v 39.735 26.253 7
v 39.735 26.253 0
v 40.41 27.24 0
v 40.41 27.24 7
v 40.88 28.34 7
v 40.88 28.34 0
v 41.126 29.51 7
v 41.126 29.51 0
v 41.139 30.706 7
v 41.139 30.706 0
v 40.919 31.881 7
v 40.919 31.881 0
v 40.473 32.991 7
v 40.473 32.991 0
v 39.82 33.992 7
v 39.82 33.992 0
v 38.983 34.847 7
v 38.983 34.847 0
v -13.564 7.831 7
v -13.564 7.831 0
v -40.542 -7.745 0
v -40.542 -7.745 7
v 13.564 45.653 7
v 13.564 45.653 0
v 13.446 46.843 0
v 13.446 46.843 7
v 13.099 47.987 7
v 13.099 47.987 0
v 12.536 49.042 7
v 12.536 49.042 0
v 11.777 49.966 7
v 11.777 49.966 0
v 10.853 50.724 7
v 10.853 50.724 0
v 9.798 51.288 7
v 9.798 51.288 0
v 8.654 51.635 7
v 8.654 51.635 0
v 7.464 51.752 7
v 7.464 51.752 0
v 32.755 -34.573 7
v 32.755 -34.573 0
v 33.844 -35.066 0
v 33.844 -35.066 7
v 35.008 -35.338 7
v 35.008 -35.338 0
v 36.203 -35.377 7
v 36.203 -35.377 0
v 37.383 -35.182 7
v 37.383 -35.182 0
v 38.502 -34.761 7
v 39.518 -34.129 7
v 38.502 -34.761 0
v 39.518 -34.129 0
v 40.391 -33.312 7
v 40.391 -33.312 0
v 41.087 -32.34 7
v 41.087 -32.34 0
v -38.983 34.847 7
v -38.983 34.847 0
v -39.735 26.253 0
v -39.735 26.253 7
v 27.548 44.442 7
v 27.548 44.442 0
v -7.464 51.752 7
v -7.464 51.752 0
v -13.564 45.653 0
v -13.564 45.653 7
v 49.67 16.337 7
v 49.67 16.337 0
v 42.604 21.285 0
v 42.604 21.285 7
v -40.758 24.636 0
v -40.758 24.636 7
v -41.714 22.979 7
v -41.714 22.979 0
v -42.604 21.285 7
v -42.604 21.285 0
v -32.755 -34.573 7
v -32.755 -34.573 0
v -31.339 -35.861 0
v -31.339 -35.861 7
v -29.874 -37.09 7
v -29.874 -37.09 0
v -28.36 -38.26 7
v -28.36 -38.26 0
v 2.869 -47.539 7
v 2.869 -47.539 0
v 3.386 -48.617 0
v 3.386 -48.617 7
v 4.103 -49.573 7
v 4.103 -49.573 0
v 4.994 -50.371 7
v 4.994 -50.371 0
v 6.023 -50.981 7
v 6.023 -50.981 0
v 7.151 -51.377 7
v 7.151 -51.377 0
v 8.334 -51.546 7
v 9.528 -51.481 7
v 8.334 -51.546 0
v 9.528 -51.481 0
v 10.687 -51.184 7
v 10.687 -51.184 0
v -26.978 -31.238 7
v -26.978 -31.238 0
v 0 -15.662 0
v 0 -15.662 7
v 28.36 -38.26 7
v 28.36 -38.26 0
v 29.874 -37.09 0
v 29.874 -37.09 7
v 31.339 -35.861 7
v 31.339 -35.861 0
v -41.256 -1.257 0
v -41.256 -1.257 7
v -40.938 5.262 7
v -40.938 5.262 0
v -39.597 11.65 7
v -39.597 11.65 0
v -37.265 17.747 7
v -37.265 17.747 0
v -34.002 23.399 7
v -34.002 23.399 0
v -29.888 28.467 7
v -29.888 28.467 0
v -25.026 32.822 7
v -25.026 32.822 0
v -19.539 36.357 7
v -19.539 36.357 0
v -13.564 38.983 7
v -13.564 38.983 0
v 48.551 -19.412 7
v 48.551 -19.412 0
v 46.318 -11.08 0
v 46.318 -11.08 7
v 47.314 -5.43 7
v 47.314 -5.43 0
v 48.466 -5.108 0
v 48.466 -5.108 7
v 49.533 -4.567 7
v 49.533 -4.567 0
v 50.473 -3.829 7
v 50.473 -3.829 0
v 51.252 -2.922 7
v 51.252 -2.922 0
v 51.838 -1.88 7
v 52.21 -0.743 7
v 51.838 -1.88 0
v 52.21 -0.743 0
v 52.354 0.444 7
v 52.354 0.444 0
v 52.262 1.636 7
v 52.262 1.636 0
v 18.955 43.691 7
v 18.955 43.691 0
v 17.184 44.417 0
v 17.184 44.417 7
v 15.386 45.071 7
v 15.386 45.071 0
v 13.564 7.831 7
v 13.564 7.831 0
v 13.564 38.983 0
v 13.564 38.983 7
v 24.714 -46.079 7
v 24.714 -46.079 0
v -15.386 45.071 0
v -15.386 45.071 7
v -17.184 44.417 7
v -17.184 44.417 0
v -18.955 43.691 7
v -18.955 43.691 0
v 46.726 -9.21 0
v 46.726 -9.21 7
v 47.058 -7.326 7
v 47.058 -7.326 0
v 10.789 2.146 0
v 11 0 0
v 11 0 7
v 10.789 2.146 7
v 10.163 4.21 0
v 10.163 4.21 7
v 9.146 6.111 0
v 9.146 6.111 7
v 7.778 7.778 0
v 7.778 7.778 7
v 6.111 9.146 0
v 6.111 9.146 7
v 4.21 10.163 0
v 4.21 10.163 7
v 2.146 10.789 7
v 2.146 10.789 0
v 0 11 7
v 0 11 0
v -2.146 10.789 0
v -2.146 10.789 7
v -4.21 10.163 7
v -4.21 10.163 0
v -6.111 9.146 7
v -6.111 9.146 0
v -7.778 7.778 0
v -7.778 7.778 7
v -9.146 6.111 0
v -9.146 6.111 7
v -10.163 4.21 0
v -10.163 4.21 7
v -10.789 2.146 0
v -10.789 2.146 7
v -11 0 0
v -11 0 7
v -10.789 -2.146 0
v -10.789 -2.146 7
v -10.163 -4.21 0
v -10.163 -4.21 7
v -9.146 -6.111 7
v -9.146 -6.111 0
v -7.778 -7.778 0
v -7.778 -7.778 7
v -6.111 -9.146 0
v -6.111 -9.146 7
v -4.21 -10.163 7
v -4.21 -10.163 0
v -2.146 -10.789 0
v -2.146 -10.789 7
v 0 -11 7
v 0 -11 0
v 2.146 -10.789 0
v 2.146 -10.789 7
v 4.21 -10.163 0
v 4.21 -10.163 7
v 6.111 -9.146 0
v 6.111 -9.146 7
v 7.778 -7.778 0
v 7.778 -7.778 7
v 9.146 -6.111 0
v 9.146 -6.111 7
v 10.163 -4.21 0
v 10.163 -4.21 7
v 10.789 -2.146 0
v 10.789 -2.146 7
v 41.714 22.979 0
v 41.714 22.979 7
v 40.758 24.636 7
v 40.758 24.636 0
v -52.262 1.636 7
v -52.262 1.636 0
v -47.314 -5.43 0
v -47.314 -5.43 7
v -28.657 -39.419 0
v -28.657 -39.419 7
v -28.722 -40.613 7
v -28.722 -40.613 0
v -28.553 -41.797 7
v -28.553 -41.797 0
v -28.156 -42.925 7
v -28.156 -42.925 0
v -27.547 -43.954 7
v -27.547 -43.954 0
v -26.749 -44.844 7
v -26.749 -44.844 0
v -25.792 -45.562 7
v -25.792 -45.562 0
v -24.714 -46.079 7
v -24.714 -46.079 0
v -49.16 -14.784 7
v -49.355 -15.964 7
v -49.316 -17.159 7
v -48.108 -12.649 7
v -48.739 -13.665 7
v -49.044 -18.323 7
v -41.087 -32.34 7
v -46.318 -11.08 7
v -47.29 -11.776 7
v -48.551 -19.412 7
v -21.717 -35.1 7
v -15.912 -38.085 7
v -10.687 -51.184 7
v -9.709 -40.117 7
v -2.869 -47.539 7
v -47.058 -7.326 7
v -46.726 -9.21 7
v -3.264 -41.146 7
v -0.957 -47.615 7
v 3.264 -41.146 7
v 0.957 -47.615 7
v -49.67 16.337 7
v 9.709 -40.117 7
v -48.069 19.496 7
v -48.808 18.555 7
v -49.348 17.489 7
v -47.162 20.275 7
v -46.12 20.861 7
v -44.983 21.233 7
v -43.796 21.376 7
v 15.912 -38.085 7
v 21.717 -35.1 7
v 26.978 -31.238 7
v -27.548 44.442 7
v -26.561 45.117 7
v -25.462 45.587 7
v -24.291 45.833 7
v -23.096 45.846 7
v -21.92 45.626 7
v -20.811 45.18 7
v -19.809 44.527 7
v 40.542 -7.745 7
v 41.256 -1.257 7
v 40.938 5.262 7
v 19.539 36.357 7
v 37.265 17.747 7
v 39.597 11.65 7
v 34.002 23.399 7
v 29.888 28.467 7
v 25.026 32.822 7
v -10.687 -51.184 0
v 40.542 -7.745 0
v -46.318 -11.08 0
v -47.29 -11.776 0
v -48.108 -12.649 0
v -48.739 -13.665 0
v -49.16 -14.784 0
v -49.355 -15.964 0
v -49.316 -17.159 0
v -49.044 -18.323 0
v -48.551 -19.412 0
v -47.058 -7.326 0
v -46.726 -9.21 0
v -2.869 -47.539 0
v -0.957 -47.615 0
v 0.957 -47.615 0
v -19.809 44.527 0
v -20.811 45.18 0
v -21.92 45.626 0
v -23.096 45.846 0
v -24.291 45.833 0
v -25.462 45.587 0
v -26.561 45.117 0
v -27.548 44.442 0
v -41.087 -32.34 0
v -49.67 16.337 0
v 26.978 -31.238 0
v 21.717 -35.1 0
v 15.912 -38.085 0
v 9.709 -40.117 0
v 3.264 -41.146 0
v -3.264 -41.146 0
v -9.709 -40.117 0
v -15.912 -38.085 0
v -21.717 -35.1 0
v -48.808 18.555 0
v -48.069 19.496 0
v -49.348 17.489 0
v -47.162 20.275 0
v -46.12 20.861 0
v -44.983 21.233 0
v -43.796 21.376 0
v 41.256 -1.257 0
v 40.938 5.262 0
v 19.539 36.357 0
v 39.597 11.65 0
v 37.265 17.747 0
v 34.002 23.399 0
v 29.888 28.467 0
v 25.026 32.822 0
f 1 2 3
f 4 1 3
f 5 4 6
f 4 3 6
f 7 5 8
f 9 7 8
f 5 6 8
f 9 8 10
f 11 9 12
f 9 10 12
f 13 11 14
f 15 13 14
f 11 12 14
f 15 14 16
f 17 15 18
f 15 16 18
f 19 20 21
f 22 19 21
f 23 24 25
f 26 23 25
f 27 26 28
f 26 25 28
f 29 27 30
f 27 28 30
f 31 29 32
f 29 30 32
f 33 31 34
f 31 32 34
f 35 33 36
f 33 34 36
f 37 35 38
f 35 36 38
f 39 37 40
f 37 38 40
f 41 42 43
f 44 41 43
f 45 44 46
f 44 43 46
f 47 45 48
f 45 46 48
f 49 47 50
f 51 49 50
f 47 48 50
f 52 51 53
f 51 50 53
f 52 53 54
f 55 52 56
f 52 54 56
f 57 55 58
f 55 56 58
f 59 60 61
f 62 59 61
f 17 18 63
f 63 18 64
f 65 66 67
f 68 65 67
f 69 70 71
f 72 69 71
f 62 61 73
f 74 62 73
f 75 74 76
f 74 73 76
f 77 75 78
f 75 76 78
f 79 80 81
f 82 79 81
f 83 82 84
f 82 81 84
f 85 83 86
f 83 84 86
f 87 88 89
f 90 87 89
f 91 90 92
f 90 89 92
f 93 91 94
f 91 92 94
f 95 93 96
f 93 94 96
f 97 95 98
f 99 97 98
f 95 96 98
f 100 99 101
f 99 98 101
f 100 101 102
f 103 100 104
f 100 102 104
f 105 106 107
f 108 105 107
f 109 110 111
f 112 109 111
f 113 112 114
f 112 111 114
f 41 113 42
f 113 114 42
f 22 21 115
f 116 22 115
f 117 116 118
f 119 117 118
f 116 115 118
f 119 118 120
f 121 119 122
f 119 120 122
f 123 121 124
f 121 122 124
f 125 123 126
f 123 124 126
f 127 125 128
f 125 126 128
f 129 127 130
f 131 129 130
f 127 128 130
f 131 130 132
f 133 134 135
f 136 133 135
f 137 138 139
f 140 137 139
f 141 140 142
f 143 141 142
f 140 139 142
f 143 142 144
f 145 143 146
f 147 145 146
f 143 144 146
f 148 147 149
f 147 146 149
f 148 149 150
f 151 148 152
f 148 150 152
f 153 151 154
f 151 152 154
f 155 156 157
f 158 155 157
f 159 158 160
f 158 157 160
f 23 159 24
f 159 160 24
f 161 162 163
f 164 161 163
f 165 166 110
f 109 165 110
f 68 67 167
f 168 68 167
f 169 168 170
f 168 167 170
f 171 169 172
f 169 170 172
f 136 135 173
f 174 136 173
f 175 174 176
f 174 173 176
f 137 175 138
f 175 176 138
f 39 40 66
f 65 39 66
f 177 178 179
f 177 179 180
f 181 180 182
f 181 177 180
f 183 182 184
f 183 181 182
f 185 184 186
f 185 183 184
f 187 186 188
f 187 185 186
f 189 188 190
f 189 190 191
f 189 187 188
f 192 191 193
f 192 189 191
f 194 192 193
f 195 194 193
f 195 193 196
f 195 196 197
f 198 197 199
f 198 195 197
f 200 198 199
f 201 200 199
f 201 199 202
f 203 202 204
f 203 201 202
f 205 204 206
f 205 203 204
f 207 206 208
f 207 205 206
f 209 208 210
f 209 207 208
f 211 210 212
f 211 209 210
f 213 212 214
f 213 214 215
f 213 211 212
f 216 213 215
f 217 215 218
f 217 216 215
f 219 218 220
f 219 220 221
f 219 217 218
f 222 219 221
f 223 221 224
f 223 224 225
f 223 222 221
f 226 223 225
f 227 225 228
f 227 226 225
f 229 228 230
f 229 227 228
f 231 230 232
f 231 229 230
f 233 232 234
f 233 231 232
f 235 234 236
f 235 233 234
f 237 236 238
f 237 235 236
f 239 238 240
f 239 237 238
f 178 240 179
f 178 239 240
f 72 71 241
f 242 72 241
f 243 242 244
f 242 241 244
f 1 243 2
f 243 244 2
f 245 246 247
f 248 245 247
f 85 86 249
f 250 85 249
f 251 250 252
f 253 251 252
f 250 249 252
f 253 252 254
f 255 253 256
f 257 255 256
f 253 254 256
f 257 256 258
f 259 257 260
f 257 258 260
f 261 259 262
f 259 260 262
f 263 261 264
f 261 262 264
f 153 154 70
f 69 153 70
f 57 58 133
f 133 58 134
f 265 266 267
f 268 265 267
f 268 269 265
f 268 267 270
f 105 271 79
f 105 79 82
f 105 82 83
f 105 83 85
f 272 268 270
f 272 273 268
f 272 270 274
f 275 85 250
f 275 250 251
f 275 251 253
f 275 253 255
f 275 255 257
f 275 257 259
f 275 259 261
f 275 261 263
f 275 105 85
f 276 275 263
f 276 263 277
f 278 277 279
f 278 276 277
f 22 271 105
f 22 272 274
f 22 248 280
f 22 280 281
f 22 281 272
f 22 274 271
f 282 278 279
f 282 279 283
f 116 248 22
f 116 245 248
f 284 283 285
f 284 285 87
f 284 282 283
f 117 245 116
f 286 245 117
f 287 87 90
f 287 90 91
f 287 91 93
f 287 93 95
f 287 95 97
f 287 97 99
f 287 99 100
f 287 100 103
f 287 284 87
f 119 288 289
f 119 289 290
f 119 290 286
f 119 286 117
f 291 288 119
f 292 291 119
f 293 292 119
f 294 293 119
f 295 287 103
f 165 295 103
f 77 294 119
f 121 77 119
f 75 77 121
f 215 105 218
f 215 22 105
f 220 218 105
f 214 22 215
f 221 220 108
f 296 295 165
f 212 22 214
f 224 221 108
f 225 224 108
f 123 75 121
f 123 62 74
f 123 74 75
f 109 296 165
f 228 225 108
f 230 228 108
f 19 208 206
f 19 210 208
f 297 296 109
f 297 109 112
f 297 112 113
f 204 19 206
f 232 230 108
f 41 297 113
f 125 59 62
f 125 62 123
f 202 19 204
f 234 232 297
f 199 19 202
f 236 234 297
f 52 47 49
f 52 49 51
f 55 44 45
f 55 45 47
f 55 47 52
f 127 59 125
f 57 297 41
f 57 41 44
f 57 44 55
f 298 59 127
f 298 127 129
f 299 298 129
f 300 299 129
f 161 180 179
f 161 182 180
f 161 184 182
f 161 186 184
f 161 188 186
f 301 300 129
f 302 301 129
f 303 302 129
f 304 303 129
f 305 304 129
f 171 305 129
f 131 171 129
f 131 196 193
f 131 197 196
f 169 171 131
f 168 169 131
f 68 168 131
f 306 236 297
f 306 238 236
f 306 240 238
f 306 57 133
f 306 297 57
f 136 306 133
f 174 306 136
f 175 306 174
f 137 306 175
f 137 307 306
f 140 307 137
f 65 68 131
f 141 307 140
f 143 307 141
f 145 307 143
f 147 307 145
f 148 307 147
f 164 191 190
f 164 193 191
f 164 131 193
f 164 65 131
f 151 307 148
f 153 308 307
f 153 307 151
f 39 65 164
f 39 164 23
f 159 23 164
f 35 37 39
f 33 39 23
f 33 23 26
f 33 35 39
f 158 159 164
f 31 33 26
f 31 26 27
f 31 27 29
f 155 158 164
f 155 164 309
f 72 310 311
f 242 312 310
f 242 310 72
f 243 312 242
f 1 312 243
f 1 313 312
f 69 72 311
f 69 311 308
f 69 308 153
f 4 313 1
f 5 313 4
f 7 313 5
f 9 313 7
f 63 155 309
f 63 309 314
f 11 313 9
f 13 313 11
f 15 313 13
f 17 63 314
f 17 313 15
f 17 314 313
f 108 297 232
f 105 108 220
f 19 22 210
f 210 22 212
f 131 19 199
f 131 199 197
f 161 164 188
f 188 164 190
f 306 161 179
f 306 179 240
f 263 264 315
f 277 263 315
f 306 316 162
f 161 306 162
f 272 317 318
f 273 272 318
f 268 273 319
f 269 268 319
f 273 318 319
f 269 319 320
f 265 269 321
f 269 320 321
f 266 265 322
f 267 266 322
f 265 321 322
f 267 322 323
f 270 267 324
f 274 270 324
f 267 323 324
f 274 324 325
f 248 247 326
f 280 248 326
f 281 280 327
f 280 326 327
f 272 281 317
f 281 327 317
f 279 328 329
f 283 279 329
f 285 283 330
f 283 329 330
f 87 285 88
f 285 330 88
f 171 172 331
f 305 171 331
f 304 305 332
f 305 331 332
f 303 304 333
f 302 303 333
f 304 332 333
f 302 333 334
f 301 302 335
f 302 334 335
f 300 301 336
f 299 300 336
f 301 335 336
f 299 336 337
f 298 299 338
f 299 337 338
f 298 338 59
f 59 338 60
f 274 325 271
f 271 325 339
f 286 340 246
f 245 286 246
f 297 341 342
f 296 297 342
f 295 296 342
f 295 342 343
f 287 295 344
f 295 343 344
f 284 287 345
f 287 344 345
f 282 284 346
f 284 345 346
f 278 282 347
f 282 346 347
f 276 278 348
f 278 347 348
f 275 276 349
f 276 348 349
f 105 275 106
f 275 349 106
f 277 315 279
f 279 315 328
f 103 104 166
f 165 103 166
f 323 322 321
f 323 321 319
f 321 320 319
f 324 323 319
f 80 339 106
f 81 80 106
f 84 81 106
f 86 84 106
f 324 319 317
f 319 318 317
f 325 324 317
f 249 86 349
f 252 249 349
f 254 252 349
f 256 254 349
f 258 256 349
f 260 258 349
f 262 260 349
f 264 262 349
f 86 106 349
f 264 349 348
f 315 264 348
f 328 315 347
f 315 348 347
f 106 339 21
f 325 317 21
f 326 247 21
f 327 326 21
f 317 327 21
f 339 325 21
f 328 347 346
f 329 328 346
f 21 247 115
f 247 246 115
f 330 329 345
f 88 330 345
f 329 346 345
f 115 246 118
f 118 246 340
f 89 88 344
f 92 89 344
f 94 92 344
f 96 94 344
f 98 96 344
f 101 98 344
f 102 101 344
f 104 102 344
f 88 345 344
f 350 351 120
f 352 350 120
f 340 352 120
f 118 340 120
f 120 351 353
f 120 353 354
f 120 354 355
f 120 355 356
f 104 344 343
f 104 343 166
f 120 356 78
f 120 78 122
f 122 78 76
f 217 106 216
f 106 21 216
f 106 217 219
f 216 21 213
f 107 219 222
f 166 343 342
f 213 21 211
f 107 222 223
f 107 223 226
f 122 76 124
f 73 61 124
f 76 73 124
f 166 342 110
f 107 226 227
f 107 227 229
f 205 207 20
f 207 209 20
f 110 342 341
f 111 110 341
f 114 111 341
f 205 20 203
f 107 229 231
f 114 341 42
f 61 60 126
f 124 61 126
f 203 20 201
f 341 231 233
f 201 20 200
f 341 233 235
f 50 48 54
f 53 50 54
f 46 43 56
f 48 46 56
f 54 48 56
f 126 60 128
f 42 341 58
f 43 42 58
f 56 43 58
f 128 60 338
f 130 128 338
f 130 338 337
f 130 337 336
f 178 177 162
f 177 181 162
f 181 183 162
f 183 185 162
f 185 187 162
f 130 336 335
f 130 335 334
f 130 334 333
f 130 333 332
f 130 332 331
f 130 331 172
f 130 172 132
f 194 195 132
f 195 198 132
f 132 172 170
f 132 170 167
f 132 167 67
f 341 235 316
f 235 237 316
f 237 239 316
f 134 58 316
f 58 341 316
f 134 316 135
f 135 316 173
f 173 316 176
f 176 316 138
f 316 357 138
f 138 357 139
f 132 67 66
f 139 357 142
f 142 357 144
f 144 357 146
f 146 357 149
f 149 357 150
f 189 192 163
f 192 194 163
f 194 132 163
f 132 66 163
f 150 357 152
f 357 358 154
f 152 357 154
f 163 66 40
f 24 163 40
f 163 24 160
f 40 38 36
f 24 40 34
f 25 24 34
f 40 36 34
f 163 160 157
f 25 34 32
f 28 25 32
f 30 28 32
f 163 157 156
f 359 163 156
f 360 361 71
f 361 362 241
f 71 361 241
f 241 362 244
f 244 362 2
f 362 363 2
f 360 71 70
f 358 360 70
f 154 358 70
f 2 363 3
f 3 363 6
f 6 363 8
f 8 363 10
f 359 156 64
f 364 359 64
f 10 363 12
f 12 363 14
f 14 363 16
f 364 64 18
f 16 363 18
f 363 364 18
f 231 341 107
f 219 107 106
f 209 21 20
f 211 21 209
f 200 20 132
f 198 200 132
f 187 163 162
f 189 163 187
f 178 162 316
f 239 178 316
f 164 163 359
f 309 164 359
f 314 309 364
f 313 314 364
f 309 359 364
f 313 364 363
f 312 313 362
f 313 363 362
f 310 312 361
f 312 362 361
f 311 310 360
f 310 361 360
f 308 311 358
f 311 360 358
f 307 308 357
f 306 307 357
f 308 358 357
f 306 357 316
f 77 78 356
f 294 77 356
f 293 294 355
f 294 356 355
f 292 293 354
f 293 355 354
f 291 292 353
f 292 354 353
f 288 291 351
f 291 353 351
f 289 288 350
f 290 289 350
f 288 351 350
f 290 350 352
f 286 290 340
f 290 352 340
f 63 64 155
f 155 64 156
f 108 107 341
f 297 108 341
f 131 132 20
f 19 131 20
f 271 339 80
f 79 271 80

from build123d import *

# Parameters (mm, degrees)
F0_R     = 13.5636
F0_R_2   = 11
F1_DEPTH = 7


# Not quite as in the source:
# - a feature names something its author has since deleted; it is built from what else it names


with BuildPart() as f1:
    # F0 (on Top) → F1 (new body)
    with BuildSketch(Plane.XY):
        with BuildLine():
            Line((-7.4638039729, 51.7525), (-13.5636, 45.6527039729))
            ThreePointArc((-13.5636, 45.6527039729), (-16.2887093259, 44.7528610649), (-18.9546720538, 43.6905142146))
            ThreePointArc((-18.9546720538, 43.6905142146), (-23.0957546511, 45.8462253684), (-27.5482602123, 44.4423557574))
            Line((-27.5482602123, 44.4423557574), (-38.9834713283, 34.8470743276))
            Line((-38.9834713283, 34.8470743276), (-39.7353128712, 26.2534861691))
            ThreePointArc((-39.7353128712, 26.2534861691), (-41.2444598552, 23.8125), (-42.6038423959, 21.2850472892))
            ThreePointArc((-42.6038423959, 21.2850472892), (-47.1617601278, 20.2745812553), (-49.6701872794, 16.3371393342))
            Line((-49.6701872794, 16.3371393342), (-52.2623391961, 1.6363152952))
            Line((-52.2623391961, 1.6363152952), (-47.3144312411, -5.4300295883))
            ThreePointArc((-47.3144312411, -5.4300295883), (-46.9014692372, -8.2699944614), (-46.318201392, -11.0799298197))
            ThreePointArc((-46.318201392, -11.0799298197), (-49.1602538961, -14.783764754), (-48.5508816958, -19.4124061506))
            Line((-48.5508816958, -19.4124061506), (-41.0870777229, -32.3400938494))
            Line((-41.0870777229, -32.3400938494), (-32.754601392, -34.5727741532))
            ThreePointArc((-32.754601392, -34.5727741532), (-30.6127599113, -36.4828666035), (-28.3597591873, -38.2604846263))
            ThreePointArc((-28.3597591873, -38.2604846263), (-28.156118511, -42.9246229316), (-24.7140789838, -46.0786710526))
            Line((-24.7140789838, -46.0786710526), (-10.6867159511, -51.1842136618))
            Line((-10.6867159511, -51.1842136618), (-2.8685295247, -47.5385334583))
            ThreePointArc((-2.8685295247, -47.5385334583), (0, -47.625), (2.8685295247, -47.5385334583))
            ThreePointArc((2.8685295247, -47.5385334583), (6.0225776457, -50.9805729855), (10.6867159511, -51.1842136618))
            Line((10.6867159511, -51.1842136618), (24.7140789838, -46.0786710526))
            Line((24.7140789838, -46.0786710526), (28.3597591873, -38.2604846263))
            ThreePointArc((28.3597591873, -38.2604846263), (30.6127599113, -36.4828666035), (32.754601392, -34.5727741532))
            ThreePointArc((32.754601392, -34.5727741532), (37.3832427886, -35.1821463535), (41.0870777229, -32.3400938494))
            Line((41.0870777229, -32.3400938494), (48.5508816958, -19.4124061506))
            Line((48.5508816958, -19.4124061506), (46.318201392, -11.0799298197))
            ThreePointArc((46.318201392, -11.0799298197), (46.9014692372, -8.2699944614), (47.3144312411, -5.4300295883))
            ThreePointArc((47.3144312411, -5.4300295883), (51.2518731622, -2.9216024367), (52.2623391961, 1.6363152952))
            Line((52.2623391961, 1.6363152952), (49.6701872794, 16.3371393342))
            Line((49.6701872794, 16.3371393342), (42.6038423959, 21.2850472892))
            ThreePointArc((42.6038423959, 21.2850472892), (41.2444598552, 23.8125), (39.7353128712, 26.2534861691))
            ThreePointArc((39.7353128712, 26.2534861691), (41.1391824821, 30.7059917302), (38.9834713283, 34.8470743276))
            Line((38.9834713283, 34.8470743276), (27.5482602123, 44.4423557574))
            Line((27.5482602123, 44.4423557574), (18.9546720538, 43.6905142146))
            ThreePointArc((18.9546720538, 43.6905142146), (16.2887093259, 44.7528610649), (13.5636, 45.6527039729))
            ThreePointArc((13.5636, 45.6527039729), (11.7770111075, 49.9659111075), (7.4638039729, 51.7525))
            Line((7.4638039729, 51.7525), (-7.4638039729, 51.7525))
        make_face()
        with BuildLine():
            ThreePointArc((26.9782471716, -31.2377944892), (0, -41.275), (-26.9782471716, -31.2377944892))
            Line((-26.9782471716, -31.2377944892), (0, -15.6618962224))
            Line((0, -15.6618962224), (26.9782471716, -31.2377944892))
        make_face(mode=Mode.SUBTRACT)
        Circle(F0_R, mode=Mode.SUBTRACT)
        with BuildLine():
            ThreePointArc((-40.5418471716, -7.7449501556), (-35.7451985412, 20.6375), (-13.5636, 38.9827446448))
            Line((-13.5636, 38.9827446448), (-13.5636, 7.8309481112))
            Line((-13.5636, 7.8309481112), (-40.5418471716, -7.7449501556))
        make_face(mode=Mode.SUBTRACT)
        with BuildLine():
            ThreePointArc((13.5636, 38.9827446448), (35.7451985412, 20.6375), (40.5418471716, -7.7449501556))
            Line((40.5418471716, -7.7449501556), (13.5636, 7.8309481112))
            Line((13.5636, 7.8309481112), (13.5636, 38.9827446448))
        make_face(mode=Mode.SUBTRACT)
        Circle(F0_R)
        Circle(F0_R_2, mode=Mode.SUBTRACT)
    extrude(amount=F1_DEPTH)


solid = f1.part
